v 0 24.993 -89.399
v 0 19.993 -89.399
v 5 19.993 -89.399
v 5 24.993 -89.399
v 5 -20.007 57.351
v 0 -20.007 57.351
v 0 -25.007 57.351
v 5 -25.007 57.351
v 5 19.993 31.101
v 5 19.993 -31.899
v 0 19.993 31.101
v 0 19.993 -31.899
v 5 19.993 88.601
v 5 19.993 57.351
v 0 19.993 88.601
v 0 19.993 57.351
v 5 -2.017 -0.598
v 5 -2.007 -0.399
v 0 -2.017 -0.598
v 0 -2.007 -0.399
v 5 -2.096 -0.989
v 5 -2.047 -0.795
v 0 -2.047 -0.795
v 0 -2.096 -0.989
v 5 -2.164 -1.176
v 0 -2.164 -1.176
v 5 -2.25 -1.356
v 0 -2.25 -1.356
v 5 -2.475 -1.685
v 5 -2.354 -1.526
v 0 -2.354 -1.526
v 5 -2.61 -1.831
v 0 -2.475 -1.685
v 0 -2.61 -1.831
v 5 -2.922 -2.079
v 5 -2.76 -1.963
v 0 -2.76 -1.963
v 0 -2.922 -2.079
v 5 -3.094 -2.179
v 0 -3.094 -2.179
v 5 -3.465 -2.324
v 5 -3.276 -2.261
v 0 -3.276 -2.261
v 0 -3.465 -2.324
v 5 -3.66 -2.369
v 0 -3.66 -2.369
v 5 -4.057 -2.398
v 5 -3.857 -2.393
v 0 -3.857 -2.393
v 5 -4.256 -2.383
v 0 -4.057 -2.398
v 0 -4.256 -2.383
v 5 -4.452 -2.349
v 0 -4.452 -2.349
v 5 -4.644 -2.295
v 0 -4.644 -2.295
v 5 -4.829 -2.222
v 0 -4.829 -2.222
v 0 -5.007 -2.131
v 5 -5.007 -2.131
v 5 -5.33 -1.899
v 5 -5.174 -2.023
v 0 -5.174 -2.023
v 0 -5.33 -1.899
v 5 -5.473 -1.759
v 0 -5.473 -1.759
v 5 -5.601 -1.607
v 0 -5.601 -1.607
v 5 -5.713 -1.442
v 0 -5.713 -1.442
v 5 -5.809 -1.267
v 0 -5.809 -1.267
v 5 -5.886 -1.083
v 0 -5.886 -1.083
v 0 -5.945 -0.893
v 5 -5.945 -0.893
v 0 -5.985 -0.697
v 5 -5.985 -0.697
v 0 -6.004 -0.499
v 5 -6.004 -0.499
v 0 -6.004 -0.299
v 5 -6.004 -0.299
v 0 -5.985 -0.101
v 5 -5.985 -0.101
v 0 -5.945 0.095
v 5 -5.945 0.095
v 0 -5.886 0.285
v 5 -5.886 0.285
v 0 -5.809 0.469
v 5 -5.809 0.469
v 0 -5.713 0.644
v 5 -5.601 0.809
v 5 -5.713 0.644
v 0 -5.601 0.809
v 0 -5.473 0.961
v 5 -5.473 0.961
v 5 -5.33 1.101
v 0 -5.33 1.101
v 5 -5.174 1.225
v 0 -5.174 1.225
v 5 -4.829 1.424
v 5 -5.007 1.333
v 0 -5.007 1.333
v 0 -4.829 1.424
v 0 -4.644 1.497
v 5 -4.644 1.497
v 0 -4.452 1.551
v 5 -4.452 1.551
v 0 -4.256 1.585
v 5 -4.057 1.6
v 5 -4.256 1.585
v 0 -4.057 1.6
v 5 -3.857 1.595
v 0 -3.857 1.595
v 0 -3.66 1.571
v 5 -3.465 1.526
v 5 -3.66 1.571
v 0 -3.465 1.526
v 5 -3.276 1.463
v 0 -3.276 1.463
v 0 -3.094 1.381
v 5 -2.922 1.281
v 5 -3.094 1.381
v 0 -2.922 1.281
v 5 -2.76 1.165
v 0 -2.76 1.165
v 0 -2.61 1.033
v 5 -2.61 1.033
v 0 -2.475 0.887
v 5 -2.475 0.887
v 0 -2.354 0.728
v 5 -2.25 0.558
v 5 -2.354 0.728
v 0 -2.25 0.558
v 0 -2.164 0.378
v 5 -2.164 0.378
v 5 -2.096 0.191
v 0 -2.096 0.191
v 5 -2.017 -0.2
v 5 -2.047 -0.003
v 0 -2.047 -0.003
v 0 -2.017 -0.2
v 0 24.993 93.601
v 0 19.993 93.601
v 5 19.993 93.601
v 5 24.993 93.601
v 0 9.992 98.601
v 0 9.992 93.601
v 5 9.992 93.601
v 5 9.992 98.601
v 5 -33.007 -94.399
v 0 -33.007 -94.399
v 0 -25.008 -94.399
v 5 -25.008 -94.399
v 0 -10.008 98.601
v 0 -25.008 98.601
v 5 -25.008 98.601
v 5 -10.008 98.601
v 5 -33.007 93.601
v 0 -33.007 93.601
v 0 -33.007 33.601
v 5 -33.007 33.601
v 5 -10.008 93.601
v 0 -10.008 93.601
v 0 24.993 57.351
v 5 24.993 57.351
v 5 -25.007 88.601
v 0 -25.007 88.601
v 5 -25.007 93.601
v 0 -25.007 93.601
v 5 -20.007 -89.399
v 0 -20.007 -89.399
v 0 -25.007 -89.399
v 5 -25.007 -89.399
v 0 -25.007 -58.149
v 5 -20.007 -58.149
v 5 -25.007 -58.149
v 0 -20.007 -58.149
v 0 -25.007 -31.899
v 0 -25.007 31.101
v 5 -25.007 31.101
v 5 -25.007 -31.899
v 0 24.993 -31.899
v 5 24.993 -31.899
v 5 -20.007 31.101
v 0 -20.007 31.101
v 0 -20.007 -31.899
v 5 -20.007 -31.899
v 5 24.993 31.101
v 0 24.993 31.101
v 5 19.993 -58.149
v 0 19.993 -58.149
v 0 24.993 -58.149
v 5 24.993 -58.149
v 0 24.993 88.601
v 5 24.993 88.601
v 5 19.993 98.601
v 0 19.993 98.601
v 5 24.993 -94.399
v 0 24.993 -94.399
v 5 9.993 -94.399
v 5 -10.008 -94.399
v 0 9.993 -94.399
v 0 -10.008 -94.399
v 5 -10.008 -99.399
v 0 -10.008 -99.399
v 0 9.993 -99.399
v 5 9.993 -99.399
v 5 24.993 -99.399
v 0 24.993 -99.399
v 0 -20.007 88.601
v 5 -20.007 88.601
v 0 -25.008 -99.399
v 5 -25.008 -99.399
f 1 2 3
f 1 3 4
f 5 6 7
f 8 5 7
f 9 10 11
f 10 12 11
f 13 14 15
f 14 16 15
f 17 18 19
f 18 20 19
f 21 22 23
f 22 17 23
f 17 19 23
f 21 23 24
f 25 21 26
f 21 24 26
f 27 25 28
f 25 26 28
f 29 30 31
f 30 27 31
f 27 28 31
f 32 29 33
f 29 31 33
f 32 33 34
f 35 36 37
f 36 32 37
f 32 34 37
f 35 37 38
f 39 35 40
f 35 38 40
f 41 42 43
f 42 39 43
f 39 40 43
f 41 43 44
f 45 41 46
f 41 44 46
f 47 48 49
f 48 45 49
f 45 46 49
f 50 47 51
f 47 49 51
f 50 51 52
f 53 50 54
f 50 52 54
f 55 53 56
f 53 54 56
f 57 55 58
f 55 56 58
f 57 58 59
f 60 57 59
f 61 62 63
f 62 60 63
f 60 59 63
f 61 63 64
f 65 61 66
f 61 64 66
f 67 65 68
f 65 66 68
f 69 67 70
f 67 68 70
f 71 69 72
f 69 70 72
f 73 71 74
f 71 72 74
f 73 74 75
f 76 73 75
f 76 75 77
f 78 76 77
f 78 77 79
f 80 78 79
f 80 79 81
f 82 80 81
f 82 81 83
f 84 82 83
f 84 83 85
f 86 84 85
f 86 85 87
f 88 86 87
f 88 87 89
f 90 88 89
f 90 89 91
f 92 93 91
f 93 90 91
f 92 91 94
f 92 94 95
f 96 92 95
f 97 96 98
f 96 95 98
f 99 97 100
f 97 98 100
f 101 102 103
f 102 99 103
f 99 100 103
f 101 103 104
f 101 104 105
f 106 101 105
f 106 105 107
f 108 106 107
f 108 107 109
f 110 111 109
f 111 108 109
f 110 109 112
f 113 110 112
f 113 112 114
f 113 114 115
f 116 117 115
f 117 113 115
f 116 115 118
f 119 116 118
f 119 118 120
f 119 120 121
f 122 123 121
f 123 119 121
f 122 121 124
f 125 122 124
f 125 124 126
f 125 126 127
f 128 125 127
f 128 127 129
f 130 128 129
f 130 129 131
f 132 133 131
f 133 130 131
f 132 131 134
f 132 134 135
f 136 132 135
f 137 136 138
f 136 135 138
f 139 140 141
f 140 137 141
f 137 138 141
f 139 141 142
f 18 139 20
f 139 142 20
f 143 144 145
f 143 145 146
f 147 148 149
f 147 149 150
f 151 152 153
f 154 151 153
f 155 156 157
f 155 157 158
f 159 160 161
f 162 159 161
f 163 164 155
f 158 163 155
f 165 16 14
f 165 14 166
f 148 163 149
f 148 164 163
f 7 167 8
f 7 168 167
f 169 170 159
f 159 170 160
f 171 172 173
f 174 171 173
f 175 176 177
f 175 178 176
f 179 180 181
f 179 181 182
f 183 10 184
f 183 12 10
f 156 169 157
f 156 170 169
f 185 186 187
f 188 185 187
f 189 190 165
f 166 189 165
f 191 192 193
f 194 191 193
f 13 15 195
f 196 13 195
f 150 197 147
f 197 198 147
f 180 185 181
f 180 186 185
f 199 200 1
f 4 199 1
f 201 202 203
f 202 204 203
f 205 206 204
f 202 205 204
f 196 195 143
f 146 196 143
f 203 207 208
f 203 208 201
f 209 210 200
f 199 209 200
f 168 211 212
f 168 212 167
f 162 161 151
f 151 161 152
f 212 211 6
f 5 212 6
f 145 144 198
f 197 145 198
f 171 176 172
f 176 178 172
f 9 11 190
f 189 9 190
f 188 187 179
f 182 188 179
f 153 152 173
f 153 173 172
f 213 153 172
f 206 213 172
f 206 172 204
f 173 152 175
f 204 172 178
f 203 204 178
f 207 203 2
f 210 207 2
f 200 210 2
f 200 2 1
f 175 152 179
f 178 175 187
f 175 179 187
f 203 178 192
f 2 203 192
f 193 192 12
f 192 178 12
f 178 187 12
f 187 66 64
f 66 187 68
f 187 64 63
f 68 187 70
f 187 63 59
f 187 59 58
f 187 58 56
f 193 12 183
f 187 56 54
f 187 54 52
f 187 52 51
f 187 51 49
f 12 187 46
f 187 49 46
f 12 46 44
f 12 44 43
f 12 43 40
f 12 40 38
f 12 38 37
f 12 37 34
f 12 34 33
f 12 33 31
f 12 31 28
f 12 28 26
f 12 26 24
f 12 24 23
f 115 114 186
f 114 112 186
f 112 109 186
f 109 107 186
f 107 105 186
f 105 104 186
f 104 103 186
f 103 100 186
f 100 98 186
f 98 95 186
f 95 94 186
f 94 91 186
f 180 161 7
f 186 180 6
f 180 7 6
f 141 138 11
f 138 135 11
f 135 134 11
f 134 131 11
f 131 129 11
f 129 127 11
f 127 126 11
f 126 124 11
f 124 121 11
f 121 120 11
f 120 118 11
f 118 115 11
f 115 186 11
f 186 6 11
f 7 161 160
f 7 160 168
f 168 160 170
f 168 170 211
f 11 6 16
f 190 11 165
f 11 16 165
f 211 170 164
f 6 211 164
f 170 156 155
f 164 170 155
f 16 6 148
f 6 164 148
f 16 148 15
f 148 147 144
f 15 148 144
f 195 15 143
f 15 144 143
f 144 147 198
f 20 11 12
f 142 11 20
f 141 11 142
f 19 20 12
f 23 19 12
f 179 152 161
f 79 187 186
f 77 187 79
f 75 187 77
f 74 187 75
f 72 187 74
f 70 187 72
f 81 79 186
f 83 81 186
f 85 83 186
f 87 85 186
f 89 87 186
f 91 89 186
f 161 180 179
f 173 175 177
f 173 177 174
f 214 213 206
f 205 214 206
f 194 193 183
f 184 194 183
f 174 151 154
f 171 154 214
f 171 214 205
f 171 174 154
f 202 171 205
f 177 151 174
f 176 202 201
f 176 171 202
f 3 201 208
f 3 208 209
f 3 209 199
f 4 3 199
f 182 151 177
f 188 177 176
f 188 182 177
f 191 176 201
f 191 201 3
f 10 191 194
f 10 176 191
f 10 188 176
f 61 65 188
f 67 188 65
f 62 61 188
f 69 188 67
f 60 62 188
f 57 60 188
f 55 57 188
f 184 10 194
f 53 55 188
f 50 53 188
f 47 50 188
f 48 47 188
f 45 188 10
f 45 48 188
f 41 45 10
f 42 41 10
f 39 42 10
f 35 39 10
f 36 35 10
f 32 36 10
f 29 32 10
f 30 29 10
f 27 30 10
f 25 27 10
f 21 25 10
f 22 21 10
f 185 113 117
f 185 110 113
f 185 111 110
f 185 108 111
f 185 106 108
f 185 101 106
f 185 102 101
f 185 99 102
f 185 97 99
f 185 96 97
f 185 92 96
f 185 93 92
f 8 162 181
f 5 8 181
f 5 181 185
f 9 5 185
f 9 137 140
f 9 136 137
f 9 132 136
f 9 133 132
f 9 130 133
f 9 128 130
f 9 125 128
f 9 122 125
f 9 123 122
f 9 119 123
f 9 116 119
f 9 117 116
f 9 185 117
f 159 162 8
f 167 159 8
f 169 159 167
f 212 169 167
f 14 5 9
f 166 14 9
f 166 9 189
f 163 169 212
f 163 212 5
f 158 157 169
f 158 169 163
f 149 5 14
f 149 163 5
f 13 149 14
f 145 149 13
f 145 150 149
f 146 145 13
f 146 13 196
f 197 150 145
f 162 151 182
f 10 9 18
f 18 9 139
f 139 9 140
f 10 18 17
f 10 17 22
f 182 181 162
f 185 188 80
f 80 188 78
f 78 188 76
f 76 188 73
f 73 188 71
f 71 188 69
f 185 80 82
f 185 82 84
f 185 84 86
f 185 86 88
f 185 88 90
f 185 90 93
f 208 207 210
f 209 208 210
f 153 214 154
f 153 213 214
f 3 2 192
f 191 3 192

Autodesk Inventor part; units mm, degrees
ref_plane "YZ Plane" through (0, 0, 0) normal (1, 0, 0) x (0, 1, 0)
ref_plane "XZ Plane" through (0, 0, 0) normal (0, 1, 0) x (-1, 0, 0)
ref_plane "XY Plane" through (0, 0, 0) normal (0, 0, 1) x (1, 0, 0)
sketch "Sketch1" plane through (0, 0, 0) normal (1, 0, 0) x (0, 1, 0)
  circle A0 centre (-4.0069, -0.399) radius 2
  line L0 (-20.007, 88.601) -> (-20.007, 57.351) projected
  line L1 (-20.007, 57.351) -> (-25.007, 57.351) projected
  line L2 (-25.007, 88.601) -> (-25.007, 57.351) projected
  line L3 (-20.007, 88.601) -> (-25.007, 88.601) projected
  line L4 (-20.007, 31.101) -> (-20.007, -31.899) projected
  line L5 (-20.007, -31.899) -> (-25.007, -31.899) projected
  line L6 (-25.007, 31.101) -> (-25.007, -31.899) projected
  line L7 (-20.007, 31.101) -> (-25.007, 31.101) projected
  line L8 (-20.007, -58.149) -> (-20.007, -89.399) projected
  line L9 (-20.007, -89.399) -> (-25.007, -89.399) projected
  line L10 (-25.007, -58.149) -> (-25.007, -89.399) projected
  line L11 (-20.007, -58.149) -> (-25.007, -58.149) projected
  line L12 (19.993, 93.601) -> (19.993, 98.601)
  line L13 (19.993, 98.601) -> (9.9915, 98.601) projected
  line L14 (9.9915, 93.601) -> (9.9915, 98.601) projected
  line L15 (-10.0085, 93.601) -> (-10.0085, 98.601) projected
  line L16 (-25.0077, 98.601) -> (-10.0085, 98.601) projected
  line L17 (-25.007, 93.601) -> (-25.007, 98.601) projected
  line L18 (-25.007, 93.601) -> (-33.007, 93.601)
  line L19 (-33.007, 93.601) -> (-33.007, -94.399)
  line L20 (-10.0085, 93.601) -> (9.9915, 93.601)
  line L21 (24.993, -99.399) -> (24.993, -94.399)
  line L22 (9.993, -99.399) -> (24.993, -99.399) projected
  line L23 (9.993, -99.399) -> (9.993, -94.399) projected
  line L24 (-10.0077, -94.399) -> (9.993, -94.399) projected
  line L25 (-10.0077, -99.399) -> (-10.0077, -94.399) projected
  line L26 (-25.0077, -99.399) -> (-10.0077, -99.399) projected
  line L27 (-25.0077, -99.399) -> (-25.0077, -94.399) projected
  line L28 (-33.0079, -94.399) -> (-25.0077, -94.399) projected
  line L29 (19.993, 93.601) -> (24.993, 93.601)
  line L30 (24.993, -94.399) -> (24.993, -89.399)
  line L31 (19.993, -89.399) -> (24.993, -89.399)
  line L32 (19.993, -89.399) -> (19.993, -58.149)
  line L33 (19.993, -58.149) -> (24.993, -58.149)
  line L34 (24.993, -58.149) -> (24.993, -31.899)
  line L35 (19.993, -31.899) -> (24.993, -31.899)
  line L36 (19.993, -31.899) -> (19.993, 31.101)
  line L37 (19.993, 31.101) -> (24.993, 31.101)
  line L38 (24.993, 31.101) -> (24.993, 57.351)
  line L39 (19.993, 57.351) -> (24.993, 57.351)
  line L40 (19.993, 57.351) -> (19.993, 88.601)
  line L41 (19.993, 88.601) -> (24.993, 88.601)
  line L42 (24.993, 88.601) -> (24.993, 93.601)
  line L43 (24.9931, -99.399) -> (24.9931, -89.399) projected
  line L44 (24.9931, -89.399) -> (19.9931, -89.399) projected
  line L45 (19.9931, -89.399) -> (19.9931, -58.149) projected
  line L46 (19.9931, -58.149) -> (24.9931, -58.149) projected
  line L47 (24.9931, -58.149) -> (24.9931, -31.899) projected
  line L48 (24.9931, -31.899) -> (19.9931, -31.899) projected
  line L49 (19.9931, -31.899) -> (19.9931, 31.101) projected
  line L50 (19.9931, 31.101) -> (24.9931, 31.101) projected
  line L51 (24.9931, 31.101) -> (24.9931, 57.351) projected
  line L52 (24.9931, 57.351) -> (19.9931, 57.351) projected
  line L53 (19.9931, 57.351) -> (19.9931, 88.601) projected
  line L54 (19.9931, 88.601) -> (24.9931, 88.601) projected
  line L55 (24.9931, 88.601) -> (24.9931, 93.601) projected
  line L56 (-33.0069, 93.601) -> (-33.0069, 33.601) projected
  circle A1 centre (-4.0069, -0.399) radius 2 projected
  line L57 (-20.007, -89.399) -> (-25.007, -89.399) projected
  line L58 (-25.007, -89.399) -> (-25.007, -58.149) projected
  line L59 (-25.007, -58.149) -> (-20.007, -58.149) projected
  line L60 (-20.007, -58.149) -> (-20.007, -89.399) projected
  line L61 (-20.007, -31.899) -> (-25.007, -31.899) projected
  line L62 (-25.007, -31.899) -> (-25.007, 31.101) projected
  line L63 (-25.007, 31.101) -> (-20.007, 31.101) projected
  line L64 (-20.007, 31.101) -> (-20.007, -31.899) projected
  line L65 (-20.007, 57.351) -> (-25.007, 57.351) projected
  line L66 (-25.007, 57.351) -> (-25.007, 88.601) projected
  line L67 (-25.007, 88.601) -> (-20.007, 88.601) projected
  line L68 (-20.007, 88.601) -> (-20.007, 57.351) projected
  dimension "d24" = 4
  dimension "d25" = 8
  dimension "d27" = 198
  dimension "d30" = 5
  dimension "d31" = 188
  dimension "d32" = 188
  dimension "d33" = 58
  dimension "d35" = 5
  dimension "d36" = 24
extrude "Extrusion1" add sketch "Sketch1" along normal blind 5
properties part number "case top sides" material "ABS Plastic"
